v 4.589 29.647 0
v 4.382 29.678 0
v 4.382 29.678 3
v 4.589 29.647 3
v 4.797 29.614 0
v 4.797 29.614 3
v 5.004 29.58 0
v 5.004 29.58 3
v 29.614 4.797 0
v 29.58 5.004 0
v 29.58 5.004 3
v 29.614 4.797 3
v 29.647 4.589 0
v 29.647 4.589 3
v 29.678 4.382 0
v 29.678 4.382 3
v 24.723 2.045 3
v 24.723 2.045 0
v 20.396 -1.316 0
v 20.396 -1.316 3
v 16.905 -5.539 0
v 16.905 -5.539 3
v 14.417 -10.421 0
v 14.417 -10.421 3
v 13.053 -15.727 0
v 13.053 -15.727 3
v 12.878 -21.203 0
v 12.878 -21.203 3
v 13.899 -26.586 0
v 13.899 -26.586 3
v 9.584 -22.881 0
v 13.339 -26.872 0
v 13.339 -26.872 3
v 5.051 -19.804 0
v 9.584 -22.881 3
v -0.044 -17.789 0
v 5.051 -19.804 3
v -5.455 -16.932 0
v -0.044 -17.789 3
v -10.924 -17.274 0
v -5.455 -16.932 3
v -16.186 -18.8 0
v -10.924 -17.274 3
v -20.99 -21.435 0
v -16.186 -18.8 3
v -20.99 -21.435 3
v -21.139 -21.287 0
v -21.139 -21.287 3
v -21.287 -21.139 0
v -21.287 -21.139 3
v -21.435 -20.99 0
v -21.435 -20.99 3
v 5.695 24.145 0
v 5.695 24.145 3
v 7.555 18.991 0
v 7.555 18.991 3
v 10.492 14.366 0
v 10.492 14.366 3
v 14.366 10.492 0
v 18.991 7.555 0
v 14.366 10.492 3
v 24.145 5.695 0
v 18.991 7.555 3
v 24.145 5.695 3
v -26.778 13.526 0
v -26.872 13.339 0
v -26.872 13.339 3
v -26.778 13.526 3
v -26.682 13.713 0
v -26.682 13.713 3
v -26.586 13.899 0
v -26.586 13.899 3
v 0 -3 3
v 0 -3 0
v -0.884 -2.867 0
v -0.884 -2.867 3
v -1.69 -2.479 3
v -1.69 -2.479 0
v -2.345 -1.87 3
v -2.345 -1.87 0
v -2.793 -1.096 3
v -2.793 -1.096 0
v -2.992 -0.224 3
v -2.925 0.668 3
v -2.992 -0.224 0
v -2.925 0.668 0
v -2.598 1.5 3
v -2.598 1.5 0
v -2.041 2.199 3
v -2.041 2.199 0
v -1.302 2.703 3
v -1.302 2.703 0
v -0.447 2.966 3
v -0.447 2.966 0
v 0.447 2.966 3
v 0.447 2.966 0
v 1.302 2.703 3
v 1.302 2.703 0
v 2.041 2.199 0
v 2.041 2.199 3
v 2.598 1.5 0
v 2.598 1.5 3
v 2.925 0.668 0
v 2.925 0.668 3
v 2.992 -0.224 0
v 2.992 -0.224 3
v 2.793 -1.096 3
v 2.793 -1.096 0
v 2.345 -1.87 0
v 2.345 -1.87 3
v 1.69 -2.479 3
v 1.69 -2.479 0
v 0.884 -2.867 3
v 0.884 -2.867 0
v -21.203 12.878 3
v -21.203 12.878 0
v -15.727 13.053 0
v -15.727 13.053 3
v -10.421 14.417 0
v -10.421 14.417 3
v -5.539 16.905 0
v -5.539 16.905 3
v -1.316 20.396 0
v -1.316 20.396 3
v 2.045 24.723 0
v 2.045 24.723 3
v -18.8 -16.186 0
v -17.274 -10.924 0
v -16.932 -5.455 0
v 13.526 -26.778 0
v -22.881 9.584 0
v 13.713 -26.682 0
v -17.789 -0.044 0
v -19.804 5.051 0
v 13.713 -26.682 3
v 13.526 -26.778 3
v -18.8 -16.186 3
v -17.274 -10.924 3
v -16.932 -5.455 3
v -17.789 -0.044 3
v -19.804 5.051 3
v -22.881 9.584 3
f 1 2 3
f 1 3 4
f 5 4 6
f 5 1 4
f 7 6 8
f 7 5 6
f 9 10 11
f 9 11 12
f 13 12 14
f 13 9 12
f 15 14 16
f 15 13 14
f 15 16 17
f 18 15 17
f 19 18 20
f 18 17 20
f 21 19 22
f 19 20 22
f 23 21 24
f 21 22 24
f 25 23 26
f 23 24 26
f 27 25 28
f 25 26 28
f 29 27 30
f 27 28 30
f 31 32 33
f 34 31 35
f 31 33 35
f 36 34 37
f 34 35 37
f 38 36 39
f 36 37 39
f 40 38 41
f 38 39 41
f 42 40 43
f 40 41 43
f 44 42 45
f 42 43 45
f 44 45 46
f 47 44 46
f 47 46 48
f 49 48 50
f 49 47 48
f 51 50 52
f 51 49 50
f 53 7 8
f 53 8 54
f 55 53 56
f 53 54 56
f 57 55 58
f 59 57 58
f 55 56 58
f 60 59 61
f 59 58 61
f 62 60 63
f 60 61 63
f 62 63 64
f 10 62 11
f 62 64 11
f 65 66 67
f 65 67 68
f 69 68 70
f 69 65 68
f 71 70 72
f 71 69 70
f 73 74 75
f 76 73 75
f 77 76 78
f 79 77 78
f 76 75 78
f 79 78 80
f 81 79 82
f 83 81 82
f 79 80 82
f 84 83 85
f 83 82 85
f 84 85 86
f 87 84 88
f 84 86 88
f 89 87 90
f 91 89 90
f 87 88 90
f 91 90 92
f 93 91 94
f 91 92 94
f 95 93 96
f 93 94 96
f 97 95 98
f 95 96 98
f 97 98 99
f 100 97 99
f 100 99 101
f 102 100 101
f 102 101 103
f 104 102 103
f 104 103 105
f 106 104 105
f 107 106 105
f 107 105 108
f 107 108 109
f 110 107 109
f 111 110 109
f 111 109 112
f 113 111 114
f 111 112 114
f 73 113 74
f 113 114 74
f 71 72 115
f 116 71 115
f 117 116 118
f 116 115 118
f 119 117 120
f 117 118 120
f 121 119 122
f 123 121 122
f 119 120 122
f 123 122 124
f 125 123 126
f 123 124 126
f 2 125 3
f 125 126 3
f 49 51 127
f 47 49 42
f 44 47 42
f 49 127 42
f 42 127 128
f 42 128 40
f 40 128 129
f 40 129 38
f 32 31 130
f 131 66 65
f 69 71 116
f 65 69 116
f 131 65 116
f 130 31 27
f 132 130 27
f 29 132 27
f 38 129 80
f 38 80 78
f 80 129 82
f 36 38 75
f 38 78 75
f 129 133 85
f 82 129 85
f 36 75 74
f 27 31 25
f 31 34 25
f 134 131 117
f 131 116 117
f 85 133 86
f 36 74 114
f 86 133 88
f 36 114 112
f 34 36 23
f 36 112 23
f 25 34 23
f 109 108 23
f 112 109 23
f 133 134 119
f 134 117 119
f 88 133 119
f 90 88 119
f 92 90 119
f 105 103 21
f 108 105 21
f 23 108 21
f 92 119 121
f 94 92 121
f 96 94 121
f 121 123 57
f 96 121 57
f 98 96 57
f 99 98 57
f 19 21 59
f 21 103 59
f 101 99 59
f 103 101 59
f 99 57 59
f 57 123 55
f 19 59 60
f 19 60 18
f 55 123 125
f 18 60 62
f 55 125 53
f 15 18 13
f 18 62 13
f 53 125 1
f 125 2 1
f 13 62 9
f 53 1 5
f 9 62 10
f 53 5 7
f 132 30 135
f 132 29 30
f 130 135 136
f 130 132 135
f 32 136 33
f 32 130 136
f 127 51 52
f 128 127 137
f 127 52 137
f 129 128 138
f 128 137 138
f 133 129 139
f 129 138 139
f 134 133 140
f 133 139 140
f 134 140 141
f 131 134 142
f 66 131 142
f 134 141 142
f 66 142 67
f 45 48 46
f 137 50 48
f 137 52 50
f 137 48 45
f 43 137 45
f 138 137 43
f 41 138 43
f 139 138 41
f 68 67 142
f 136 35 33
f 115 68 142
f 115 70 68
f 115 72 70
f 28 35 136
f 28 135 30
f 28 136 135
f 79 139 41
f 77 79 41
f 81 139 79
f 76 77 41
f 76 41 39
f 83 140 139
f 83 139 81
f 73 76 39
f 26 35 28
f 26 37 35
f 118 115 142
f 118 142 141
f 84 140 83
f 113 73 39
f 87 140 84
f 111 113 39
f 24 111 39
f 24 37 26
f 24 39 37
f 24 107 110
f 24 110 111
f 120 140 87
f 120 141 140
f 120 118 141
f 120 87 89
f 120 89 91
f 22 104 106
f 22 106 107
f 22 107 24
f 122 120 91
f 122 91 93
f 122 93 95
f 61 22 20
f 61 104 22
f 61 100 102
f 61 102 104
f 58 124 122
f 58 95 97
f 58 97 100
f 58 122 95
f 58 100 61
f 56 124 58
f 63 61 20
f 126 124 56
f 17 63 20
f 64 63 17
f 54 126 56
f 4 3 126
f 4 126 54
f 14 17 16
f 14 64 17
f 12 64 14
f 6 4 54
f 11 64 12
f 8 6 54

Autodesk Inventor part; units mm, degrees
ref_plane "YZ Plane" through (0, 0, 0) normal (1, 0, 0) x (0, 1, 0)
ref_plane "XZ Plane" through (0, 0, 0) normal (0, 1, 0) x (-1, 0, 0)
ref_plane "XY Plane" through (0, 0, 0) normal (0, 0, 1) x (1, 0, 0)
sketch "Sketch1" plane through (0, 0, 0) normal (0, 0, 1) x (1, 0, 0)
  circle A0 centre (0, 0) radius 30
  dimension "d0" = 60
extrude "Extrusion1" add sketch "Sketch1" along normal blind 3
sketch "Sketch2" plane through (0, 0, 3) normal (0, 0, 1) x (1, 0, 0)
  circle A0 centre (0, 0) radius 30 projected
  circle A1 centre (30, 30) radius 25
  dimension "d6" = 50
  dimension "d7" = 30
  dimension "d8" = 30
extrude "Extrusion2" cut sketch "Sketch2" against normal through all contours A1 A0 | A0 A1 picked at (18.8229, 17.5315) picked at (30.2504, 29.5845)
pattern_circular "Circular Pattern1" count 5 over 360 about axis through (0, 0, -10) along (0, 0, 1) of "Extrusion2"
sketch "Sketch3" plane through (0, 0, 3) normal (0, 0, 1) x (1, 0, 0)
  point P0 (0, 0)
  point P1 (0, 0)
hole "Hole1" at (0, 0, 3) direction (0, 0, -1) diameter 6 end through all
equation "\"d8\" = d7"
properties part number "Timing_Star"
